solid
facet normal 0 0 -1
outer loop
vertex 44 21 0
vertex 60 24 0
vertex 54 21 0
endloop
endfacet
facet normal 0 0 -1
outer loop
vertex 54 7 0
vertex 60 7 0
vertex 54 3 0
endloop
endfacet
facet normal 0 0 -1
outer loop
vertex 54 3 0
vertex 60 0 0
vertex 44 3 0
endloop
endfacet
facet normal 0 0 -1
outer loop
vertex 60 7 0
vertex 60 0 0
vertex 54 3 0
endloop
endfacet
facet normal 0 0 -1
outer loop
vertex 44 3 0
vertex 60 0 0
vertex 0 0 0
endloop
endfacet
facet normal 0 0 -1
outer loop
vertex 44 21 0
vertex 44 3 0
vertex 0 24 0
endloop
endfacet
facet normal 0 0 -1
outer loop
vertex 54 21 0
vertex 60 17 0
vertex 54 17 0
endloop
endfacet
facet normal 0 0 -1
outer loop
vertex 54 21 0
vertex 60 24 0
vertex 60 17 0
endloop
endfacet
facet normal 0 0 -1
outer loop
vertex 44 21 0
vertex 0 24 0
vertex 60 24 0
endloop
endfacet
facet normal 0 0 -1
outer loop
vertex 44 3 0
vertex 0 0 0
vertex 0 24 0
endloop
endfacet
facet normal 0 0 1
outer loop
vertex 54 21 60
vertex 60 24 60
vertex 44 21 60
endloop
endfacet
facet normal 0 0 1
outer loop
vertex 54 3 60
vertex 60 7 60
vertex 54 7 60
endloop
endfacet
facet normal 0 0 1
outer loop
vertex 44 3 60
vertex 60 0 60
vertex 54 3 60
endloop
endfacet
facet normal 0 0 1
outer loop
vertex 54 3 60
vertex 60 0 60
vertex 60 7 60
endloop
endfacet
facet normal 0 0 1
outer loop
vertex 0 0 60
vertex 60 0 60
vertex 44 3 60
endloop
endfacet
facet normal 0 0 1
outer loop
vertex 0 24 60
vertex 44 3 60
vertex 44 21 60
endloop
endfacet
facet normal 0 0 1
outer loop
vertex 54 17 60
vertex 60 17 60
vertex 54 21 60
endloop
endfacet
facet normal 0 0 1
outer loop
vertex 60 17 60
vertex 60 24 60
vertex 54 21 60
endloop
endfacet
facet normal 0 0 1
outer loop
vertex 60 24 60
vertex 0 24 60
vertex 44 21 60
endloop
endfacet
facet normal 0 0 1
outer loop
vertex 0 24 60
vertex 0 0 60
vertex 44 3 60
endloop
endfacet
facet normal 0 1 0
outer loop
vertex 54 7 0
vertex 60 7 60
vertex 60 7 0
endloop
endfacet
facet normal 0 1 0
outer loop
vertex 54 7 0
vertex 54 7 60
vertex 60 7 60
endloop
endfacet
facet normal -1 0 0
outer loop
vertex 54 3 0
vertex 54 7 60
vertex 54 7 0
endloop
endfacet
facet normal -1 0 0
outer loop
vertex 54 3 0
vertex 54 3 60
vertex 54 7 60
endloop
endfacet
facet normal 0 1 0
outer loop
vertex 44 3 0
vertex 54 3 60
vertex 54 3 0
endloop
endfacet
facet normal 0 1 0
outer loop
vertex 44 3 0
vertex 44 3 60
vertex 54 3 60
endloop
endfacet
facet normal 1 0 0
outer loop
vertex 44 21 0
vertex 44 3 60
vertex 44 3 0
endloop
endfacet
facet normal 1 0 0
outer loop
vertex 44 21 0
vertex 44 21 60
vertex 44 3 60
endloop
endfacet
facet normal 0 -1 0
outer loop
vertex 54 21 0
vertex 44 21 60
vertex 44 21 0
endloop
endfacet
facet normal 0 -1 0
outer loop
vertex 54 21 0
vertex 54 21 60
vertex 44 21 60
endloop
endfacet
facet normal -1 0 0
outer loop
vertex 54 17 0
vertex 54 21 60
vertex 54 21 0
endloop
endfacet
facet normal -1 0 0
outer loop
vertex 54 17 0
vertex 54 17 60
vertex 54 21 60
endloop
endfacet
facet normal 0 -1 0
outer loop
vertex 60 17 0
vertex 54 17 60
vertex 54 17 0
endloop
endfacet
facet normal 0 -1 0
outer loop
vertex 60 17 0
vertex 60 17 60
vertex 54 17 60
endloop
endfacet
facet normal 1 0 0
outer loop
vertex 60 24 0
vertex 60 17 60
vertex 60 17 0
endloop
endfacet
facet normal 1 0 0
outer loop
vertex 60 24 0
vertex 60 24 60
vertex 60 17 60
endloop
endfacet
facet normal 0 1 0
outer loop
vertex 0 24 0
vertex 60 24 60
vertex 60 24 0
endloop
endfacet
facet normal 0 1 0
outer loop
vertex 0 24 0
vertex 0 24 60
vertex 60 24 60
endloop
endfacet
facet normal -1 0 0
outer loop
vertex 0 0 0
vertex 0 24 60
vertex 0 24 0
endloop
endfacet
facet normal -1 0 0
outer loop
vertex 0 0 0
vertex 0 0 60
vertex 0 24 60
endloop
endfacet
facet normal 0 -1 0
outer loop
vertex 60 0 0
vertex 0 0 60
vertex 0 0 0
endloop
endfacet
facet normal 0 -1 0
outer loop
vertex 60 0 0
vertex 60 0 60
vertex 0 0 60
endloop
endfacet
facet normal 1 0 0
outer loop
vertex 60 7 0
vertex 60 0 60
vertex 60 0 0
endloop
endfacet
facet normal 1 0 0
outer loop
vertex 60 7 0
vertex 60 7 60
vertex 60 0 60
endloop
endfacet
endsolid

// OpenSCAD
$fn = 32;

// ----------------------------------------------------------------------
// T-slot rail: 60 x 24 mm section, 60 mm long
// ----------------------------------------------------------------------

// --- parameters (mm) ---
profile_height = 60;      // extrusion height
profile_points = 12;      // points of the closed outline

profile = [[0, 0], [60, 0], [60, 7], [54, 7], [54, 3], [44, 3], [44, 21], [54, 21], [54, 17], [60, 17], [60, 24], [0, 24]];  // single closed polygon, 12 points, counter clockwise

// --- the one profile operation ---
linear_extrude(height = profile_height) polygon(points = profile);
